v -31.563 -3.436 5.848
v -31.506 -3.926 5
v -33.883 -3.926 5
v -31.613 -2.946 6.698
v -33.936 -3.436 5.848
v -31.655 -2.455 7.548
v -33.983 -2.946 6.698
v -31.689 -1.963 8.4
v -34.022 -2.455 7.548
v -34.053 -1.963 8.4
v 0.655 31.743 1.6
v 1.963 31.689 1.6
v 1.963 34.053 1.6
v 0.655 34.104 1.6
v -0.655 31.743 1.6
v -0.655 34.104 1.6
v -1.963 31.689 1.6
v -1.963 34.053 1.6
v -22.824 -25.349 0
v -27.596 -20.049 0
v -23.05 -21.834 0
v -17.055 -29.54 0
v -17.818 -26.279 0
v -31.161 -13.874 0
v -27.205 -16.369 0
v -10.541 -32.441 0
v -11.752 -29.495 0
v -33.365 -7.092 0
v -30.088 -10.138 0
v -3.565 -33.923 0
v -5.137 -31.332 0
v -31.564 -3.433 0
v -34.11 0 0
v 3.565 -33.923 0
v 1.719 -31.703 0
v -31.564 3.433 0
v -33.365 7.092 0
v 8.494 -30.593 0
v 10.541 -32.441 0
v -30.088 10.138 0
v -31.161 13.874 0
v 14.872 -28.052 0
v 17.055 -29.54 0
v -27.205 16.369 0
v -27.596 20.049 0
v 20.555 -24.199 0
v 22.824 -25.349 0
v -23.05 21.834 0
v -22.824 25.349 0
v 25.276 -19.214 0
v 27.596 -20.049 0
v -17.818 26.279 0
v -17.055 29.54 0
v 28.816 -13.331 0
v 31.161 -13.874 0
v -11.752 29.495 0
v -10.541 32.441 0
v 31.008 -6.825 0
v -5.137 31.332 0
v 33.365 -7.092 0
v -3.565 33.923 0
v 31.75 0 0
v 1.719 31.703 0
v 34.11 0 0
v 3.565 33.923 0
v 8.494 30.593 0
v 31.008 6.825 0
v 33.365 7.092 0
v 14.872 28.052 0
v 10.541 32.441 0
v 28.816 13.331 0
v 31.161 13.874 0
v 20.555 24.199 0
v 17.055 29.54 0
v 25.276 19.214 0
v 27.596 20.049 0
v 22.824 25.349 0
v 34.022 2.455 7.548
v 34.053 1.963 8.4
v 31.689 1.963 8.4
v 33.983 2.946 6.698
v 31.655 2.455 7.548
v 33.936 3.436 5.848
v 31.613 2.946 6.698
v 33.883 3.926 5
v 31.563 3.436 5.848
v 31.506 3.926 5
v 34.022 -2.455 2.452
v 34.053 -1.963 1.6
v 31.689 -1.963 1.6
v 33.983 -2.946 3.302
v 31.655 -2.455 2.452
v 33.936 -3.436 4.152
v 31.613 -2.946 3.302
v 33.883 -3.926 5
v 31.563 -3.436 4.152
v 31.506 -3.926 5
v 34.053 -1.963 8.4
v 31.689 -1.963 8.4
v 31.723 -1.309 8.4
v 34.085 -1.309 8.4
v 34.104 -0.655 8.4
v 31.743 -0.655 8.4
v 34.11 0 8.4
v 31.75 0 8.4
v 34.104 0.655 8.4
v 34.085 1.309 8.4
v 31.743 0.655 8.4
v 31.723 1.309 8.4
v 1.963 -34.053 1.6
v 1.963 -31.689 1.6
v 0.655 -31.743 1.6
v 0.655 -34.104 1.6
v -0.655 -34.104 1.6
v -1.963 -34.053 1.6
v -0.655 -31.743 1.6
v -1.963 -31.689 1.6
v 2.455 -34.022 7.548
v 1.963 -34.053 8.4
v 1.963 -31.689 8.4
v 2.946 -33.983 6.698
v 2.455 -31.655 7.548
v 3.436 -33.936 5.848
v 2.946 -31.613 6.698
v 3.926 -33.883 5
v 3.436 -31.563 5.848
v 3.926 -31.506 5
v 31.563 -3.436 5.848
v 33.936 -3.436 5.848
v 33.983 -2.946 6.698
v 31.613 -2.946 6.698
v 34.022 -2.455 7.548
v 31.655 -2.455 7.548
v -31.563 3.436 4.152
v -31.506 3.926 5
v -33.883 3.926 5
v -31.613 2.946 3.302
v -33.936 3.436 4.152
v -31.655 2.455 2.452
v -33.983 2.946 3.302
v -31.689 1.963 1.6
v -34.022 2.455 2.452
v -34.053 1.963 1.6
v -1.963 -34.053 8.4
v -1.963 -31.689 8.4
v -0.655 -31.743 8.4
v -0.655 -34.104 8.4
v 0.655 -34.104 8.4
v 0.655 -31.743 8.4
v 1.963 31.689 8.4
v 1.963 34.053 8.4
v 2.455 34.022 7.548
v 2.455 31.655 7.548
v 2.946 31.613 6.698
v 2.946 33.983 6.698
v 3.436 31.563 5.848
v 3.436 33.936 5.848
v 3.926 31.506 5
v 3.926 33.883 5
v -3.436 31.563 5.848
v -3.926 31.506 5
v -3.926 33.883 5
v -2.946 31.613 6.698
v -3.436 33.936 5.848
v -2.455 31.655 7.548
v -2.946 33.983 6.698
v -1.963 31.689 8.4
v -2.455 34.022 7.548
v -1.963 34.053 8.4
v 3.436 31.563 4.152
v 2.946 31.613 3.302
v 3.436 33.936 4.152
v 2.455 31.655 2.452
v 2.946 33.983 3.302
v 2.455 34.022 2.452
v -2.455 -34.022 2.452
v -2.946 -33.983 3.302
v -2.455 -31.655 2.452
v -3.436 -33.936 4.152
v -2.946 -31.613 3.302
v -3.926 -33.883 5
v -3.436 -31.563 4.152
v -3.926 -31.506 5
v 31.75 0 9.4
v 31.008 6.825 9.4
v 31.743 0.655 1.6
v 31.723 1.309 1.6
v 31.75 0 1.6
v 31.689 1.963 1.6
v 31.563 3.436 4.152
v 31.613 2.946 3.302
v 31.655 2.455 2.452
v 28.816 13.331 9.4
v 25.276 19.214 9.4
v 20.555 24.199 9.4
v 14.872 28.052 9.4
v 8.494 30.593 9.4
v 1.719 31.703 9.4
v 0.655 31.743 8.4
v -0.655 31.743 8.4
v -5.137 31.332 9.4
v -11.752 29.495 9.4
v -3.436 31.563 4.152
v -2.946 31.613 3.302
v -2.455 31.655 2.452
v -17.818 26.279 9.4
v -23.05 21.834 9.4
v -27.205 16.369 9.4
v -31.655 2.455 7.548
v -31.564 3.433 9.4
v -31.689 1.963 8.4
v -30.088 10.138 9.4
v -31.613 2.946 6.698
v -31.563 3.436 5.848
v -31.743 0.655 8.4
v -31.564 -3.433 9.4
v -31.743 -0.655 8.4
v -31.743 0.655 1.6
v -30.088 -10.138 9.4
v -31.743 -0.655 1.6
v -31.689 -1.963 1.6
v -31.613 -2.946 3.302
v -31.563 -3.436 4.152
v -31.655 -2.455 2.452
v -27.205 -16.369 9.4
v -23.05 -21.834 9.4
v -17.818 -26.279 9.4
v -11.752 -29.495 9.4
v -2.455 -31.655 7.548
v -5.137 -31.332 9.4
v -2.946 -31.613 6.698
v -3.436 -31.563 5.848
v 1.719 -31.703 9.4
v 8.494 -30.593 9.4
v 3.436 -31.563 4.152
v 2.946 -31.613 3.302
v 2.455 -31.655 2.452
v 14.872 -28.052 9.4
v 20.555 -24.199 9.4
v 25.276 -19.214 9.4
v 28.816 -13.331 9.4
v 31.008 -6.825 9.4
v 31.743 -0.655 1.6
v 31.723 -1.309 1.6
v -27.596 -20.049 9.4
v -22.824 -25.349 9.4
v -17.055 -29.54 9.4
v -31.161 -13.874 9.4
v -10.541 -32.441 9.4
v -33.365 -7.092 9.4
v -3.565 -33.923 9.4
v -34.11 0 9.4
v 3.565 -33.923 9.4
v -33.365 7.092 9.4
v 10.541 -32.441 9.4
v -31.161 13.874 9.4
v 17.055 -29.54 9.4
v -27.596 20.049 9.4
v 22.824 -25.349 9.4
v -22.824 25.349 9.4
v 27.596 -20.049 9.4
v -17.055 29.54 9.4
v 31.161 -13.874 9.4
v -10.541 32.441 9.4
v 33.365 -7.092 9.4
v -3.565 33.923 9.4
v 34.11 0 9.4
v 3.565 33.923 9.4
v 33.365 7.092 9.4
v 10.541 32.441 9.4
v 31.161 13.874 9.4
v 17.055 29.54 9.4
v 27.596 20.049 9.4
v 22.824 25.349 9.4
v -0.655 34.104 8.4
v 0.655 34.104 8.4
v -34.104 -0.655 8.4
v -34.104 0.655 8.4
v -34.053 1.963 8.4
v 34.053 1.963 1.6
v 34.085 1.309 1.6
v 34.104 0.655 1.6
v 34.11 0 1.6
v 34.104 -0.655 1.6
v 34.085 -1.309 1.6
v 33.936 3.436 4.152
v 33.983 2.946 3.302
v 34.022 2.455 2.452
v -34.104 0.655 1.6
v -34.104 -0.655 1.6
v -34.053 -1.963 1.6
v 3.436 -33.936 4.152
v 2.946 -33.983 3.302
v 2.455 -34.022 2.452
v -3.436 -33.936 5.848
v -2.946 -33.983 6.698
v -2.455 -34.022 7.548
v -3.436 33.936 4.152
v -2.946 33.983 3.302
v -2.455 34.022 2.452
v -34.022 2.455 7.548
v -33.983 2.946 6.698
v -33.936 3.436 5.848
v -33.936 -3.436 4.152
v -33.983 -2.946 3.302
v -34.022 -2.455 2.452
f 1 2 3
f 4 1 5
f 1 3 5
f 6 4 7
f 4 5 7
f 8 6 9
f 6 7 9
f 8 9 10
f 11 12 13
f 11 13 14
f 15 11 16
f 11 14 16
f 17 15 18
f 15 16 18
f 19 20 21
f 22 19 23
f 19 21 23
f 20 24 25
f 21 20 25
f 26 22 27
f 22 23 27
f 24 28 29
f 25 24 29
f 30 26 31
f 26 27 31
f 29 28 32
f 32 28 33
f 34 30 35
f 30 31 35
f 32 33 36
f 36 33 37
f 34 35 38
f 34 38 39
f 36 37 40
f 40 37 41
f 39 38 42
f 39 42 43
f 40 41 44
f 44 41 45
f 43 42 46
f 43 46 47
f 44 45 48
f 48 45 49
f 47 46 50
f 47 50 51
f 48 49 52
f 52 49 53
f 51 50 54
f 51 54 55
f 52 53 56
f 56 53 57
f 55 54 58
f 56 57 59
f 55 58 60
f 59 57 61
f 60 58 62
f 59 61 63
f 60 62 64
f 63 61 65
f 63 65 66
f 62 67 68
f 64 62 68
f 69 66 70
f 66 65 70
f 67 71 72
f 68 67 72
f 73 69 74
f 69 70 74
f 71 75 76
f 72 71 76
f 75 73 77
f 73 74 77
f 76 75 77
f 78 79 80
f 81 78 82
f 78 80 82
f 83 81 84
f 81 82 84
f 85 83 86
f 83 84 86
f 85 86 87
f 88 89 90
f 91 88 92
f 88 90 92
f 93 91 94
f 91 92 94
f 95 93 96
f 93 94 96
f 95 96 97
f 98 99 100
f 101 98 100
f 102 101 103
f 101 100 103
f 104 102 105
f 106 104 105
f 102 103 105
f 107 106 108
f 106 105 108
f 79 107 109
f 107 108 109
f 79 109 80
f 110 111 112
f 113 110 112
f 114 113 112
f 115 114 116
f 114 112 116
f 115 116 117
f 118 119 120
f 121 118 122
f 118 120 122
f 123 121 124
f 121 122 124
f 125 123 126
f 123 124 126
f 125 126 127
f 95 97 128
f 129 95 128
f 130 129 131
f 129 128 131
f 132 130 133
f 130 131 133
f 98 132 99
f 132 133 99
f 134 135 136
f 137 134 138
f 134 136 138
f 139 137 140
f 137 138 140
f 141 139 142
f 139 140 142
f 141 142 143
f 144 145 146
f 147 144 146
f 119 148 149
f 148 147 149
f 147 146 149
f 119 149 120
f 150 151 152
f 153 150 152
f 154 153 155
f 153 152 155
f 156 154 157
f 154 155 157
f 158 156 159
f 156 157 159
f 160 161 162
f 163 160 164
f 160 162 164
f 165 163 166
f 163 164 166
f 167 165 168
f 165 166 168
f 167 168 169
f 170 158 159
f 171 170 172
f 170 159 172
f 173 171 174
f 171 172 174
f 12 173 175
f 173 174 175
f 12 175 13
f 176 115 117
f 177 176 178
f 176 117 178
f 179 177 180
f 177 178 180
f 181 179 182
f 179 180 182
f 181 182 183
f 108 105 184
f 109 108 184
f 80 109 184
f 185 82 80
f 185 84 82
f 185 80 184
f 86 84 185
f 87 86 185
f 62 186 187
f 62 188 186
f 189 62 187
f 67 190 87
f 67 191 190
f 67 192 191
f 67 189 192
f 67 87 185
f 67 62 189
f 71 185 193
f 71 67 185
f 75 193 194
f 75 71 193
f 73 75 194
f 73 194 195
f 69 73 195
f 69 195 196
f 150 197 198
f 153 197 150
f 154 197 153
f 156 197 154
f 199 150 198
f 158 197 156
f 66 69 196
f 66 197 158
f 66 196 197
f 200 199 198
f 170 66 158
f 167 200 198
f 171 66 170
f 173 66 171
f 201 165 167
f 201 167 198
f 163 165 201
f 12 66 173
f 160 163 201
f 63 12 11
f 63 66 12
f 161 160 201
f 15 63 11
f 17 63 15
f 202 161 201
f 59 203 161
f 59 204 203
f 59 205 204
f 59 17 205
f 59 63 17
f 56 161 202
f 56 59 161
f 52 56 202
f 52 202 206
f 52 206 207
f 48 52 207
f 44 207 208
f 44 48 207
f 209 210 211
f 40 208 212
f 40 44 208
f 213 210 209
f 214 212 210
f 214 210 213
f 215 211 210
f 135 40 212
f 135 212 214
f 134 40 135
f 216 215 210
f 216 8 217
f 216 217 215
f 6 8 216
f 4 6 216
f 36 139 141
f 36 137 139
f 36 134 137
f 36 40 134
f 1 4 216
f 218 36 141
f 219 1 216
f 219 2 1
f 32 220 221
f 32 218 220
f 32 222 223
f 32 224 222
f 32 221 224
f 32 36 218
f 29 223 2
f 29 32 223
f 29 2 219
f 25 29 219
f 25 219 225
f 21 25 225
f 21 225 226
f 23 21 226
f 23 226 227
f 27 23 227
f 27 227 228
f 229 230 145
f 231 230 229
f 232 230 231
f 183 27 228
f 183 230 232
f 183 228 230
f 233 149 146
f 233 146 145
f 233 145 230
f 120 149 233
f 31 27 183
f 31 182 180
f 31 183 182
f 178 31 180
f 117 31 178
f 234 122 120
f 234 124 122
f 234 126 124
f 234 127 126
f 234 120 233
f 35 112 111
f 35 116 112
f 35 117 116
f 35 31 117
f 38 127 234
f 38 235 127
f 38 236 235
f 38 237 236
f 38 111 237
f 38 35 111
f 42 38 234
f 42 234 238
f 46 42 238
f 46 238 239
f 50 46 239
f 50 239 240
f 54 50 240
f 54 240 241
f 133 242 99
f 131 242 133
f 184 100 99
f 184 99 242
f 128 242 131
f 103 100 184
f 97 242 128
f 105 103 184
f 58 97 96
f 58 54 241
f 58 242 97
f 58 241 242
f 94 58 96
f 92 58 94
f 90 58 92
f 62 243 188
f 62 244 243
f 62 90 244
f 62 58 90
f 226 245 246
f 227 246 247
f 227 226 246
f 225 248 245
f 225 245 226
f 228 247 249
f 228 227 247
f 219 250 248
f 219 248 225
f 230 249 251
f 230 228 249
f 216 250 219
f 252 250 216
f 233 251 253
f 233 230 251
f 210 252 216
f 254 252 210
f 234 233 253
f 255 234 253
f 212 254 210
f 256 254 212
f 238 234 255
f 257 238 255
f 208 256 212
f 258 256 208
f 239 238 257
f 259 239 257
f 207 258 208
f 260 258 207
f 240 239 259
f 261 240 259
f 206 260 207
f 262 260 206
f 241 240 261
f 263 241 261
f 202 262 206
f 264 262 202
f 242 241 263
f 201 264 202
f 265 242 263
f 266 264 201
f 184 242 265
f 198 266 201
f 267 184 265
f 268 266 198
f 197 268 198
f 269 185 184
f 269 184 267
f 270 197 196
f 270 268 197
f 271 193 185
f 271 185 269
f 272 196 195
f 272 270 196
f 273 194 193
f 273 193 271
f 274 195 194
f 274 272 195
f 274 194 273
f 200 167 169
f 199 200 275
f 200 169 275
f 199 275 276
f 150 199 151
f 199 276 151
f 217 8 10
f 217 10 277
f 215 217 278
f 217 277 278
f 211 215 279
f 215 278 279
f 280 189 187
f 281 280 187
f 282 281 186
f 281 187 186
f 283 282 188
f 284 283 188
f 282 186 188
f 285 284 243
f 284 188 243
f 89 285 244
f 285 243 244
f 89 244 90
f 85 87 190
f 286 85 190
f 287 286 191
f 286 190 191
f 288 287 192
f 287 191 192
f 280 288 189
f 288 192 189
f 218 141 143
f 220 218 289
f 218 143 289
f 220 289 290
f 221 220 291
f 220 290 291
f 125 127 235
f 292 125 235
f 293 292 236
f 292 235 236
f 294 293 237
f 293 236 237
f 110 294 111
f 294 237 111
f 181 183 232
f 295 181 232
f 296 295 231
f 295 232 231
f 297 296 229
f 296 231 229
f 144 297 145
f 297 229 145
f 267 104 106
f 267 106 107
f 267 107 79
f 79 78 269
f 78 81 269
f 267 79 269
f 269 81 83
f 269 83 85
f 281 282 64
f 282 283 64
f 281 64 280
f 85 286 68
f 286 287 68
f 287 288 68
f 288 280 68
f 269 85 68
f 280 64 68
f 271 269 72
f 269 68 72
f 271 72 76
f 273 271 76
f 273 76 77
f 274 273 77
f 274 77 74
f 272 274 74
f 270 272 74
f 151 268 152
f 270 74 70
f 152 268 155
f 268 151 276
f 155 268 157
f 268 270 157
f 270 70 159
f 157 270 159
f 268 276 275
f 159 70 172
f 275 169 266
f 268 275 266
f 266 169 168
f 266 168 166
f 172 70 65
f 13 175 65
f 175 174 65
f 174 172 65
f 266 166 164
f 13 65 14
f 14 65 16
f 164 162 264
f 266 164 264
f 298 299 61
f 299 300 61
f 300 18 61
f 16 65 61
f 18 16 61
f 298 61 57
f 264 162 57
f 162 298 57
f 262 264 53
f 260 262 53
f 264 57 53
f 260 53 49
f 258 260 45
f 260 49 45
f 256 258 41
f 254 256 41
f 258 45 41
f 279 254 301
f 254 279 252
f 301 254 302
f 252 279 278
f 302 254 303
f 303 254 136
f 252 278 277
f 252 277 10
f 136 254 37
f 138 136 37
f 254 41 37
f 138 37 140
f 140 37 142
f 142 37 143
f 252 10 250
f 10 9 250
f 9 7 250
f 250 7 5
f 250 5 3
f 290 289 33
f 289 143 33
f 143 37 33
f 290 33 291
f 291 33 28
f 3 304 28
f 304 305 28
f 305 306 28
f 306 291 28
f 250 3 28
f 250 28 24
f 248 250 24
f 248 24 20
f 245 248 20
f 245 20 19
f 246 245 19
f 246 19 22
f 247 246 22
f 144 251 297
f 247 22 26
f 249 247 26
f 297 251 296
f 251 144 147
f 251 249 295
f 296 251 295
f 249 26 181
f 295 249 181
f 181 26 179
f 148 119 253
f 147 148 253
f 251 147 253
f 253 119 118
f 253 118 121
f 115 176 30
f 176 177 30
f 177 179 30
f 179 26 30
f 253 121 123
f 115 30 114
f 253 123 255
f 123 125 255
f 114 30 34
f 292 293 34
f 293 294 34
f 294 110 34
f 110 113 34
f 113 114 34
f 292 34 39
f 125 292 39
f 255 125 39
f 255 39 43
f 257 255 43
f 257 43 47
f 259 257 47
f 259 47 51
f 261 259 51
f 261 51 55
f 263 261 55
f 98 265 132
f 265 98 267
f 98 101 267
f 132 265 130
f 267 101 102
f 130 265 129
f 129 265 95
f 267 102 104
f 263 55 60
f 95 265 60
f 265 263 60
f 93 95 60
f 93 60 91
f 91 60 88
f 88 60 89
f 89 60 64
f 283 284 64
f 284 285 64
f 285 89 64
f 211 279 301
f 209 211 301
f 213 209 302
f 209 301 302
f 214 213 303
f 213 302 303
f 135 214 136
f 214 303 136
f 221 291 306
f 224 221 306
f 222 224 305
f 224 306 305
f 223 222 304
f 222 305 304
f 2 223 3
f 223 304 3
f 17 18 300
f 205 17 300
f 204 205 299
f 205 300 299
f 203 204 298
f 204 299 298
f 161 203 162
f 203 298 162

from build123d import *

# Parameters (mm, degrees)
SKETCH1_R           = 34.11
SKETCH1_R_2         = 31.75
BOSS_EXTRUDE1_DEPTH = 9.4
CUT_EXTRUDE1_DEPTH  = 69.22
CIRPATTERN2_COUNT   = 2
CIRPATTERN2_ANGLE   = 90


with BuildPart() as part:
    # Sketch1 → Boss-Extrude1 (new body)
    with BuildSketch(Plane.XY):
        Circle(SKETCH1_R)
        Circle(SKETCH1_R_2, mode=Mode.SUBTRACT)
    extrude(amount=BOSS_EXTRUDE1_DEPTH)

    # Sketch2 → Cut-Extrude1 (cut, through all)
    with BuildSketch(Plane(origin=(0, 34.11, 0), x_dir=(1, 0, 0), z_dir=(0, 1, 0))):
        Polygon((3.92598183, -5), (1.962990915, -1.6), (-1.962990915, -1.6), (-3.92598183, -5), (-1.962990915, -8.4), (1.962990915, -8.4), align=None)
    cut_extrude1 = extrude(amount=-CUT_EXTRUDE1_DEPTH, mode=Mode.SUBTRACT)

    # CirPattern2: Cut-Extrude1 ×2 about axis
    cirpattern2_axis = Axis((0, 0, 9.4), (0, 0, 1))
    for i in range(1, CIRPATTERN2_COUNT):
        add(cut_extrude1.rotate(cirpattern2_axis, i * CIRPATTERN2_ANGLE / (CIRPATTERN2_COUNT - 1)), mode=Mode.SUBTRACT)


solid = part.part
